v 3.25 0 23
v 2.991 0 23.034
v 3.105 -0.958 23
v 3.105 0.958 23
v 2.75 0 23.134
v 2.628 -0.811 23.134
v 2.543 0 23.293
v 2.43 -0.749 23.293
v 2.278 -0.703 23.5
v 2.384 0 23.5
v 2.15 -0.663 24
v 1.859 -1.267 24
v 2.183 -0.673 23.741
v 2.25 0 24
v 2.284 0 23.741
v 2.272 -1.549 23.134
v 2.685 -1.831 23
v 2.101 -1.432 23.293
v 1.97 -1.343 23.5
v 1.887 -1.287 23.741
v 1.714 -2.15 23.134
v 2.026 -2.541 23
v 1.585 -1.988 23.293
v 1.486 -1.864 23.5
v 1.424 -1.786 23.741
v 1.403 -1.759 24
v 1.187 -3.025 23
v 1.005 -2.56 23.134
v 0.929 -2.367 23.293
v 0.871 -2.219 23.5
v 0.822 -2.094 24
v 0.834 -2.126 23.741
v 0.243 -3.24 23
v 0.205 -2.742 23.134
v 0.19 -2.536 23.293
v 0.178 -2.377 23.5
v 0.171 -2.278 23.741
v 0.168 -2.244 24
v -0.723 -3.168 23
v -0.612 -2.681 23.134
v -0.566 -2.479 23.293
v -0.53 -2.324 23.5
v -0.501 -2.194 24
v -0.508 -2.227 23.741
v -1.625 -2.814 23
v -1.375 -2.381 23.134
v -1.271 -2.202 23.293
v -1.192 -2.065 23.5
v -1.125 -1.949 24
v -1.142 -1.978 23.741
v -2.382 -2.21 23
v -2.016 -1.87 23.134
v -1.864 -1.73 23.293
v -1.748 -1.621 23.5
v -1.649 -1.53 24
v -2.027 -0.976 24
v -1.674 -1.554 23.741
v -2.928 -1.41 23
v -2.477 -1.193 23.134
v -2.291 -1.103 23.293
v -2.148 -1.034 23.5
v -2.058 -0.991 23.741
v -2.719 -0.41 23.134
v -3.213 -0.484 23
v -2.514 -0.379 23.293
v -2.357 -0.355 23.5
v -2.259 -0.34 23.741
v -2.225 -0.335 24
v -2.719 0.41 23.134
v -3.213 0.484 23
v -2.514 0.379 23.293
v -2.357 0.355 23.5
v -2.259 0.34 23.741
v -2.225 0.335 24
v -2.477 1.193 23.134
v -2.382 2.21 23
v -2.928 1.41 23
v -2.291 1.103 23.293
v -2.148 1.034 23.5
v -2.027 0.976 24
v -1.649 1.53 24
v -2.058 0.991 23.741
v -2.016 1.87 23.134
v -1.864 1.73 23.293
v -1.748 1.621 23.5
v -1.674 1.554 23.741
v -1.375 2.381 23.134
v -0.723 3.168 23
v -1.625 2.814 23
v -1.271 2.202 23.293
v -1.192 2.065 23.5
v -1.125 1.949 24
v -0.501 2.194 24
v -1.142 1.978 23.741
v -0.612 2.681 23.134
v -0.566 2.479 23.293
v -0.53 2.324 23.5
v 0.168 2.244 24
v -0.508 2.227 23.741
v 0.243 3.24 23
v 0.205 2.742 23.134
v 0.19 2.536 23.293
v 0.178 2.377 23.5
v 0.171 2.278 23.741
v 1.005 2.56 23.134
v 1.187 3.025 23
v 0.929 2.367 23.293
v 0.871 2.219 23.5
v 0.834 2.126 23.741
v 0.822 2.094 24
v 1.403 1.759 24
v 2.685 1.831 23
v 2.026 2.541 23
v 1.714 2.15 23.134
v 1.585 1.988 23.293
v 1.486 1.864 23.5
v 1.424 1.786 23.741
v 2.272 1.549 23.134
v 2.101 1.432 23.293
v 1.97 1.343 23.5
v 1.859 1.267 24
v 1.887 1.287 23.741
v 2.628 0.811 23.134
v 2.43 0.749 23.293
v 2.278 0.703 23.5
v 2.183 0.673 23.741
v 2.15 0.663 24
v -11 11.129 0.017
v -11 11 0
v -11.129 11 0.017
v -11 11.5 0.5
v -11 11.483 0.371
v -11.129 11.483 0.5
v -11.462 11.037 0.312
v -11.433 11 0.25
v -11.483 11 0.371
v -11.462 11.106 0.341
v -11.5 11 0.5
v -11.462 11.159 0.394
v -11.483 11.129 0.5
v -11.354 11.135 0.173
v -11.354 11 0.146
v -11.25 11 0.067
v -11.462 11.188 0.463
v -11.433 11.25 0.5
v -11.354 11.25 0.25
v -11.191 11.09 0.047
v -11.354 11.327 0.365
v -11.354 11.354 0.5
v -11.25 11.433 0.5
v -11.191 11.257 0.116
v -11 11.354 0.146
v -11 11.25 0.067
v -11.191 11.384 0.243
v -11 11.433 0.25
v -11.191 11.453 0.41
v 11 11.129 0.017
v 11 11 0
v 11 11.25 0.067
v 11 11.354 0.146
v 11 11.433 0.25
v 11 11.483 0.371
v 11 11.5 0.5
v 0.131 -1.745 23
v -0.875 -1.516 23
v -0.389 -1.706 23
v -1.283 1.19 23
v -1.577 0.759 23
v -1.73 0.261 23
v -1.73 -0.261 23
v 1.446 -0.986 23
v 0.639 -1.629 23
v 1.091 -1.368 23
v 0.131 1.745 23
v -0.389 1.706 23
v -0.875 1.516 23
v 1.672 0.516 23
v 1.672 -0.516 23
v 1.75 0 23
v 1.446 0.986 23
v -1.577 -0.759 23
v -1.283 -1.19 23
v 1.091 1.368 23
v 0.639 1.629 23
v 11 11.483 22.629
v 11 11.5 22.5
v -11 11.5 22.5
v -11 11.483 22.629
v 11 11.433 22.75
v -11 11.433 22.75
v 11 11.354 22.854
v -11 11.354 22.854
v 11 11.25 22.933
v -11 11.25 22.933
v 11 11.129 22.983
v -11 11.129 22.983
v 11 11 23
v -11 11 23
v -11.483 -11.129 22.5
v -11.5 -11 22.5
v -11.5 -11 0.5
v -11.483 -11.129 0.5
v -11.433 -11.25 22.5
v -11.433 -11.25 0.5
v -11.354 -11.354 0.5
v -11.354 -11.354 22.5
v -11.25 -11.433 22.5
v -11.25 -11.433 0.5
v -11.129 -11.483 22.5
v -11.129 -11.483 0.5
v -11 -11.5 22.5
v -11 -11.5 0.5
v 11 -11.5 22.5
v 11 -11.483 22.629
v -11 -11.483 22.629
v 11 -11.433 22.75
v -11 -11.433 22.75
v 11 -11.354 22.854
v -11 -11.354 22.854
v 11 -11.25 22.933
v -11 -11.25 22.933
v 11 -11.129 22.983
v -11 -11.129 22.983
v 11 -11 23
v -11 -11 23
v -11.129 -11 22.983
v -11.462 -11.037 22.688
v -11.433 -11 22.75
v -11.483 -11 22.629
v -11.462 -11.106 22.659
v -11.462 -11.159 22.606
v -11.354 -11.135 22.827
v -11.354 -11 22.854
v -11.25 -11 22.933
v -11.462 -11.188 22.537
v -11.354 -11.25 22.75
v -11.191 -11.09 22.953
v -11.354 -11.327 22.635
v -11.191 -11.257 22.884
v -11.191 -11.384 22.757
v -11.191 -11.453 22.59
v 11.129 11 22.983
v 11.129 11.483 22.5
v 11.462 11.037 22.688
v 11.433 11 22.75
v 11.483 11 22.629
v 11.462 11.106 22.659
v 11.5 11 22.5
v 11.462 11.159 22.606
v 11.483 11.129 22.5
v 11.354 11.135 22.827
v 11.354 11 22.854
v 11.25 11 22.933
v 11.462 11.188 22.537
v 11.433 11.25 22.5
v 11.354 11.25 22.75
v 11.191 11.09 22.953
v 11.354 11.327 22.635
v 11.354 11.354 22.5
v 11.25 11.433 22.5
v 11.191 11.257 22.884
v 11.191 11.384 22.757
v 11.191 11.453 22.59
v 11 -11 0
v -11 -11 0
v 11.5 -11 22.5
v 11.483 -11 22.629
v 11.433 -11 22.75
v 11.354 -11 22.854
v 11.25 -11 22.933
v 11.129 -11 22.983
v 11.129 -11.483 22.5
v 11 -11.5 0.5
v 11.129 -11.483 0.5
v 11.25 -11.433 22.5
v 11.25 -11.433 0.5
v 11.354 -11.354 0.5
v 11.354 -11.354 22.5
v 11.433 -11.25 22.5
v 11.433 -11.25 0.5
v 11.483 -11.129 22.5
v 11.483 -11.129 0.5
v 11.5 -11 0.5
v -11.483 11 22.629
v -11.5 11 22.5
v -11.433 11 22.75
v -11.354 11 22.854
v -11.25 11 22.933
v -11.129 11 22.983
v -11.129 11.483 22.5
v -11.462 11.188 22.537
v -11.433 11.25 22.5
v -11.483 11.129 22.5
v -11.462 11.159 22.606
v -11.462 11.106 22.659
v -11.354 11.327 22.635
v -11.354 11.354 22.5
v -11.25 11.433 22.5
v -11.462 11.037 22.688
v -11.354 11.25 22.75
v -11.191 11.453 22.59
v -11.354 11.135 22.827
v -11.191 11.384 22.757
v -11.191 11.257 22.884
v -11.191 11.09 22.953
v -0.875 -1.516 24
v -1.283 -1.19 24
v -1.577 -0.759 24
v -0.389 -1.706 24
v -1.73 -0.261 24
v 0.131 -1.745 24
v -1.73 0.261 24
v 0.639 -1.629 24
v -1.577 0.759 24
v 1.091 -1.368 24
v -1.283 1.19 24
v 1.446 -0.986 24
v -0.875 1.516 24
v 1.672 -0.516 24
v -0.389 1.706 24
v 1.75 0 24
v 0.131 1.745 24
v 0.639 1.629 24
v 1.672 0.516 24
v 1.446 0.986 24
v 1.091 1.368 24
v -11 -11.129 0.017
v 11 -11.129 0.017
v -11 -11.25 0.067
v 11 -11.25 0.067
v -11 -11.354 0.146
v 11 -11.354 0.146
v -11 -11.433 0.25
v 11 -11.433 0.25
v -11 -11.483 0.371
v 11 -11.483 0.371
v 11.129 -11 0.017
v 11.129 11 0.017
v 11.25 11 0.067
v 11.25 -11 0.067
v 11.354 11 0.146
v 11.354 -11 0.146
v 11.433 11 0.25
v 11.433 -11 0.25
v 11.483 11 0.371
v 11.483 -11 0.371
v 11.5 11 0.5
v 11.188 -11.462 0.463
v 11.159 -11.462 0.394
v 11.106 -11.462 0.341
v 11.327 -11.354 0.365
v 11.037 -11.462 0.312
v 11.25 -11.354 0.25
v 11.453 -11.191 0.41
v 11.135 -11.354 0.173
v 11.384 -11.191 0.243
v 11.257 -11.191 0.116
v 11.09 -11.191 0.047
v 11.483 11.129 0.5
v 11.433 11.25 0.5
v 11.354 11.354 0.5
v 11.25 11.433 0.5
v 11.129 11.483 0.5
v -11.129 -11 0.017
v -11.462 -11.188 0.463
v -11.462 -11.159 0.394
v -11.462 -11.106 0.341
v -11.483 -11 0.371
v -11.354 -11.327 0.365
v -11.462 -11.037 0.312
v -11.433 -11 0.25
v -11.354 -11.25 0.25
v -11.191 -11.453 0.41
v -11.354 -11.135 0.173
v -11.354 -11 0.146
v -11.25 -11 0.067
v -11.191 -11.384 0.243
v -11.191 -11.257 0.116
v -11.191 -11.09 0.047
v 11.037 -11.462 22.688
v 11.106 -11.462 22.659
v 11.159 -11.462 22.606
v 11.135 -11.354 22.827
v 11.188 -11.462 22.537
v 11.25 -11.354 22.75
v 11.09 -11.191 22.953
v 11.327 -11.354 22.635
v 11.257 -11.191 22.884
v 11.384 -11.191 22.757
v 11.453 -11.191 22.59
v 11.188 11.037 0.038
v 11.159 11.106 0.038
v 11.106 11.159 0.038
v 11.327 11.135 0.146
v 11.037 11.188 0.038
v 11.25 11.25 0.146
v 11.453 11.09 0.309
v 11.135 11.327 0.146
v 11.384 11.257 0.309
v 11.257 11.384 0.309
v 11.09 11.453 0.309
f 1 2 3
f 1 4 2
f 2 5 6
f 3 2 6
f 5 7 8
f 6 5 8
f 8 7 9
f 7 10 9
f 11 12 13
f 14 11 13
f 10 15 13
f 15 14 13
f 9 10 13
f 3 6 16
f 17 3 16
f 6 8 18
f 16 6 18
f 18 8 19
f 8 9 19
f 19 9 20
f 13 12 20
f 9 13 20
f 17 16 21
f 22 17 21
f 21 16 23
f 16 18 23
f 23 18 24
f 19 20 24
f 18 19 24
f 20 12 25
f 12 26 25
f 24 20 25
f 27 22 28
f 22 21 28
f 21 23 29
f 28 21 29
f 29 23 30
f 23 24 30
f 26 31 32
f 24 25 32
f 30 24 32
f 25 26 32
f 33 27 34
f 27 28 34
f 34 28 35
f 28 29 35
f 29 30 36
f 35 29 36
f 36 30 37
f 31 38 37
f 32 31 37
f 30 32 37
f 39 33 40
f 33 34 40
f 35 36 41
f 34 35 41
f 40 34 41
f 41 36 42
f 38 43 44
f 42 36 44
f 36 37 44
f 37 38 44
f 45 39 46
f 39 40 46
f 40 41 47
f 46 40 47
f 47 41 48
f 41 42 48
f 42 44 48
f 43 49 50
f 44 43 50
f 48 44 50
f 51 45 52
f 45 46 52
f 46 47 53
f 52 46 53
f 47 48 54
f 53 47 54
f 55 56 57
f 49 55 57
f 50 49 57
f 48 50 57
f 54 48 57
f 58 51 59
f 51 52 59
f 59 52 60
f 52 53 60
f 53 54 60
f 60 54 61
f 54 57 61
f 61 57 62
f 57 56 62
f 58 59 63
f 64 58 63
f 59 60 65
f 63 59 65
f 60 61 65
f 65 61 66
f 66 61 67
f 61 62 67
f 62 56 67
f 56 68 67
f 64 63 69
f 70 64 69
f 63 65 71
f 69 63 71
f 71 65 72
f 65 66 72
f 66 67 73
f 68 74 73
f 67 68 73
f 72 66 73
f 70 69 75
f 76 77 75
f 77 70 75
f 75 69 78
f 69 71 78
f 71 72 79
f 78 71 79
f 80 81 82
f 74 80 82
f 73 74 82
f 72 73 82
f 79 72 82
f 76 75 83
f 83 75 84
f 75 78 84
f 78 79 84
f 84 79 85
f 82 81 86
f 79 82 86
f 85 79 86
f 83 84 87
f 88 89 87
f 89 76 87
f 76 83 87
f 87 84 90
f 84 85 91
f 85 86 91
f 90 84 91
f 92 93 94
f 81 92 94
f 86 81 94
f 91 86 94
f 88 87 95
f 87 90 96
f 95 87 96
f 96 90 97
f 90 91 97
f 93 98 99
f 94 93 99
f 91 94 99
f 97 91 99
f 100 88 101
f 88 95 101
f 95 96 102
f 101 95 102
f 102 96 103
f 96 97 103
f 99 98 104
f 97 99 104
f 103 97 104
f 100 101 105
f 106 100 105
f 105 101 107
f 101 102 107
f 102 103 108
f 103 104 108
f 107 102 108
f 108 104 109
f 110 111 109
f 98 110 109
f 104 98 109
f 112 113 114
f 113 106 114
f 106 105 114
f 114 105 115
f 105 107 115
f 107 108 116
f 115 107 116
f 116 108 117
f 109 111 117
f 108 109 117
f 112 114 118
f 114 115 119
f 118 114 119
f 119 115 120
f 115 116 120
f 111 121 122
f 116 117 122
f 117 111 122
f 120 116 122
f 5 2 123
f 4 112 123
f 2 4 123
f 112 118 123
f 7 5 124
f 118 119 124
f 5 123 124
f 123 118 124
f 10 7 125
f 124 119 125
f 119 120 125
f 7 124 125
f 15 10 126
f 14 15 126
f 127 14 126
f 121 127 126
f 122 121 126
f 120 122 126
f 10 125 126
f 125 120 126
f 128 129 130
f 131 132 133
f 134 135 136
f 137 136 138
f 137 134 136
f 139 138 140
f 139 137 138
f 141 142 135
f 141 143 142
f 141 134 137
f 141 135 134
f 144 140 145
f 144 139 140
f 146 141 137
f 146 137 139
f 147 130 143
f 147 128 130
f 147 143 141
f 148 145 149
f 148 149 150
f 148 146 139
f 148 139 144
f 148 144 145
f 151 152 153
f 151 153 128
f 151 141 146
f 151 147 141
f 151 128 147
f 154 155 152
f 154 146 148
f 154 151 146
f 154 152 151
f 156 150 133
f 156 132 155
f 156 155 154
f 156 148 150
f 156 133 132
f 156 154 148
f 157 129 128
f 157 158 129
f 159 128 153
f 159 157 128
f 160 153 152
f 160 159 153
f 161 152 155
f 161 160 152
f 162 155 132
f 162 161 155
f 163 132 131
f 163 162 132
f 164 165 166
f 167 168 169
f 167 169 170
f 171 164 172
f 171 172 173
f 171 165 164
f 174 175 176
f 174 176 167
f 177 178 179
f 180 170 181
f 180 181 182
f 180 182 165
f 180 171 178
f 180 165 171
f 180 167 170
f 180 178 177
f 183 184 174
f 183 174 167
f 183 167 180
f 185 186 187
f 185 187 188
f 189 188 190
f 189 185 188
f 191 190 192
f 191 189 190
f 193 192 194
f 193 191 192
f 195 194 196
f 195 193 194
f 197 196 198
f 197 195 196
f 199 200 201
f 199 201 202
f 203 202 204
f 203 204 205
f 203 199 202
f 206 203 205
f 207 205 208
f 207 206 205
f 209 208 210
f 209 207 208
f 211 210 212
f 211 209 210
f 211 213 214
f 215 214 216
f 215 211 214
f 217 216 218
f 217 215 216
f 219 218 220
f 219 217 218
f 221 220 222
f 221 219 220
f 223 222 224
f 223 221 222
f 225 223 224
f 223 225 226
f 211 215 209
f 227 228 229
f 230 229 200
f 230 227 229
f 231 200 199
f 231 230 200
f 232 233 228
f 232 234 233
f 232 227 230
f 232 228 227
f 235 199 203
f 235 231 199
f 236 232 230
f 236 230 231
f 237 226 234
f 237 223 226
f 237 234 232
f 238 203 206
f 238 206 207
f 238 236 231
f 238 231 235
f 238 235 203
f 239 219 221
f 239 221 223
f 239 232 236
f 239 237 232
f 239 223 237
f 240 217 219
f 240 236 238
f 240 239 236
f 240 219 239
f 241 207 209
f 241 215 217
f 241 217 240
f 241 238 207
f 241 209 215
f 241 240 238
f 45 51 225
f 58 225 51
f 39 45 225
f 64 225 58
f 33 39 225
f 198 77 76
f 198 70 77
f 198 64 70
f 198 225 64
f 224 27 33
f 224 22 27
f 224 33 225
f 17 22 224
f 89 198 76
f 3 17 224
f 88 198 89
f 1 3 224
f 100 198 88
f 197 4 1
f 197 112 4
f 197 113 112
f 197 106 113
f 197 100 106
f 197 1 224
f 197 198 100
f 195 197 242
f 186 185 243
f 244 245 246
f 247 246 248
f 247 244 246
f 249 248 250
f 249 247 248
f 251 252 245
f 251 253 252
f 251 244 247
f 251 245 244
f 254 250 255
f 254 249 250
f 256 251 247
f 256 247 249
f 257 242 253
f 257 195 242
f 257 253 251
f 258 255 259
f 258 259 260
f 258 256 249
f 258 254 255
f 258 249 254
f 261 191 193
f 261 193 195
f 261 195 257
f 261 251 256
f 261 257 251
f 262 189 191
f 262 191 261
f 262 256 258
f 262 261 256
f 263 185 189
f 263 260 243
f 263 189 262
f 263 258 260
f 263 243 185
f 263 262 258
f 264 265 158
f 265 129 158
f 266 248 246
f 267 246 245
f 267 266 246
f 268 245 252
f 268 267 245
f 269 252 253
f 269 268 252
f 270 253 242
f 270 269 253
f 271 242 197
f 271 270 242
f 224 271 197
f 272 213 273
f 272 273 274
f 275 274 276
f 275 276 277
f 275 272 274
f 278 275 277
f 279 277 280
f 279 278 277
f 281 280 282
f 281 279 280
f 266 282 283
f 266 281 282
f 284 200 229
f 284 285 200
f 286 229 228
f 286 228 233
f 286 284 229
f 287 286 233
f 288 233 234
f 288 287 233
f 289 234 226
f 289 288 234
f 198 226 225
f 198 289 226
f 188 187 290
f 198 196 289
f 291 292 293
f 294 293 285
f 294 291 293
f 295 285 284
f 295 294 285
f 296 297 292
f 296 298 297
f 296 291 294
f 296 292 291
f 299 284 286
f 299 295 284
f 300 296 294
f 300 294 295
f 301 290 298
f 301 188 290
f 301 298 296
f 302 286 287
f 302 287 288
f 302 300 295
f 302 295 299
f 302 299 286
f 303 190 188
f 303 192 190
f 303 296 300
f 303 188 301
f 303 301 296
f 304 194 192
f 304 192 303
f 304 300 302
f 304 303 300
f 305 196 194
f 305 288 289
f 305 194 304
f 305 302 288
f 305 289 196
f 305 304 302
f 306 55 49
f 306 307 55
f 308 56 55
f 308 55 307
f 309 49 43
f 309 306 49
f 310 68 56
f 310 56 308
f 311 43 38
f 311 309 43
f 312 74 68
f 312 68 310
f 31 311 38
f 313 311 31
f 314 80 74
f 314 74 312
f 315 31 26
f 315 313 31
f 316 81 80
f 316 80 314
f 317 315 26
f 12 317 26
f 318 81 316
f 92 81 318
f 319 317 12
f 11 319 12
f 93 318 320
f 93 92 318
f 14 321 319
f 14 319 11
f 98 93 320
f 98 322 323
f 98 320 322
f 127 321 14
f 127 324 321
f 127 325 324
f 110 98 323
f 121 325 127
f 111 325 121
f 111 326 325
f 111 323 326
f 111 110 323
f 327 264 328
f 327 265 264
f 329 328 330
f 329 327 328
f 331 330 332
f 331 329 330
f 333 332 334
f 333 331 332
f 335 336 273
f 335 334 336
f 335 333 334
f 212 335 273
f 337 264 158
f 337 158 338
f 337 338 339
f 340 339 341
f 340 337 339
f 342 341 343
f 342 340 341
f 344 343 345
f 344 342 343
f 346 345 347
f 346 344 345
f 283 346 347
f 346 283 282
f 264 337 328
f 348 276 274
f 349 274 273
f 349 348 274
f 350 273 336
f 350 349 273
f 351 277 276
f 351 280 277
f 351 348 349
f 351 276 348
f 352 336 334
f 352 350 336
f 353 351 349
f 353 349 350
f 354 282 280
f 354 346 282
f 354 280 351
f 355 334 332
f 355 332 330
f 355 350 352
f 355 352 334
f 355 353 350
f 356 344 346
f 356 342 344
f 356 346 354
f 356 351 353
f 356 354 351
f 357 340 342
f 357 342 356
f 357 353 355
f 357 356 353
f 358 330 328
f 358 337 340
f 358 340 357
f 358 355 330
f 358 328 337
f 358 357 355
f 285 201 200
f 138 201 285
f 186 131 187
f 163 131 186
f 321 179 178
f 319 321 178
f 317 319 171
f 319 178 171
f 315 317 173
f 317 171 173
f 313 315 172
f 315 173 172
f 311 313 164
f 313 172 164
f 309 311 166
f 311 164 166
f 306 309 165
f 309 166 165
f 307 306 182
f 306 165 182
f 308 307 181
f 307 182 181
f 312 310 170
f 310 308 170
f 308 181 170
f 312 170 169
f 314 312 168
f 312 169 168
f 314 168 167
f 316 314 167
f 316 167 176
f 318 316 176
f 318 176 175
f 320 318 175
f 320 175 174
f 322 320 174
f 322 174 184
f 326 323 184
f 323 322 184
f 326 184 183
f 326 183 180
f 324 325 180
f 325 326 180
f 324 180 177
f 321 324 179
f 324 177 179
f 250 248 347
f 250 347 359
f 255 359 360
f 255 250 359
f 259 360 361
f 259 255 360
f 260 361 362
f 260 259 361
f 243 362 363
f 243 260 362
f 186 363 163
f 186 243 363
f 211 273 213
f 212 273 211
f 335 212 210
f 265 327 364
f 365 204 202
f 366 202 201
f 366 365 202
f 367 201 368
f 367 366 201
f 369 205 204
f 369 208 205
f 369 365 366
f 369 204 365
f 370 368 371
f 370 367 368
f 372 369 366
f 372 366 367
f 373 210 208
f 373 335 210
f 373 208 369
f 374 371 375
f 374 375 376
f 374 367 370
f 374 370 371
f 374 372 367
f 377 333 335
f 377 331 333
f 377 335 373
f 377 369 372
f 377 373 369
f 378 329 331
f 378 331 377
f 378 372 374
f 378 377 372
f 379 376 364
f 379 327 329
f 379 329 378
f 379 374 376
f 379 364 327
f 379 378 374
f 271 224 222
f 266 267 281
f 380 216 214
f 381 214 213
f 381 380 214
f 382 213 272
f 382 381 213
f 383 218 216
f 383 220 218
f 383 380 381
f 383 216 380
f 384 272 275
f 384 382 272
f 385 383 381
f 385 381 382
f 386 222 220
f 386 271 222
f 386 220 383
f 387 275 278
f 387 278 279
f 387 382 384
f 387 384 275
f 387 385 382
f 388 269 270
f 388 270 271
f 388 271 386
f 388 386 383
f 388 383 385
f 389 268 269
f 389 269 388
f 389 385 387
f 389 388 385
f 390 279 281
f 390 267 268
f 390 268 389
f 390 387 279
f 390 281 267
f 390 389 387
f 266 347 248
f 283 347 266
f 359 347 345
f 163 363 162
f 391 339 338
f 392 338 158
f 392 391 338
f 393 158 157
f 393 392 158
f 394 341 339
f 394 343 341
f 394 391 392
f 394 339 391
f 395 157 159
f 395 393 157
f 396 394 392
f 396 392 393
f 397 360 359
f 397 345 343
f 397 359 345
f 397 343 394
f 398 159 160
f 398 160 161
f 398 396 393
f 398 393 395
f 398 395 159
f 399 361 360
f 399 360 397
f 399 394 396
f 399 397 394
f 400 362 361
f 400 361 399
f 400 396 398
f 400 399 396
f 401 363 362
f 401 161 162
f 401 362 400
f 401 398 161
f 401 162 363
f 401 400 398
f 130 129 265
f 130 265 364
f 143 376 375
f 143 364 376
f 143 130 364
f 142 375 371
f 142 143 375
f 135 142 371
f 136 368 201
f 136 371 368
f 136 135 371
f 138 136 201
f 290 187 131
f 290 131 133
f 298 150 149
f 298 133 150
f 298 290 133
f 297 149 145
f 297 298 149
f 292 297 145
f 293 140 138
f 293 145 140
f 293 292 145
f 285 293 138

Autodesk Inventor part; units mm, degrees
ref_plane "YZ Plane" through (0, 0, 0) normal (1, 0, 0) x (0, 1, 0)
ref_plane "XZ Plane" through (0, 0, 0) normal (0, 1, 0) x (-1, 0, 0)
ref_plane "XY Plane" through (0, 0, 0) normal (0, 0, 1) x (1, 0, 0)
sketch "Szkic1" plane through (0, 0, 0) normal (0, 0, 1) x (1, 0, 0)
  line L0 (11.5, -11.5) -> (-11.5, -11.5)
  line L1 (-11.5, -11.5) -> (-11.5, 11.5)
  line L2 (-11.5, 11.5) -> (11.5, 11.5)
  line L3 (11.5, 11.5) -> (11.5, -11.5)
  line L4 (11.5, -11.5) -> (-11.5, 11.5) construction
  line L5 (-11.5, -11.5) -> (11.5, 11.5) construction
  point P0 (0, 0)
  dimension "d0" = 23
  dimension "d1" = 23
extrude "Wyciągnięcie proste1" add sketch "Szkic1" along normal blind 23
fillet "Zaokrąglenie1" radius 0.5 12 edges at (0, 11.5, 23) (11.5, 11.5, 11.5) (11.5, 0, 23) (11.5, 0, 0) (11.5, -11.5, 11.5) (0, -11.5, 23) (0, -11.5, 0) (-11.5, -11.5, 11.5) (0, 11.5, 0) (-11.5, 11.5, 11.5) (-11.5, 0, 0) (-11.5, 0, 23)
sketch "Szkic2" plane through (0, 0, 23) normal (0, 0, 1) x (1, 0, 0)
  circle A0 centre (0, 0) radius 1.75
  circle A1 centre (0, 0) radius 2.25
  dimension "d5" = 3.5
  dimension "d6" = 4.5
extrude "Wyciągnięcie proste2" add sketch "Szkic2" along normal blind 1
fillet "Zaokrąglenie2" radius 1 1 edges at (-2.25, 0, 23)
properties part number "Kamera"
